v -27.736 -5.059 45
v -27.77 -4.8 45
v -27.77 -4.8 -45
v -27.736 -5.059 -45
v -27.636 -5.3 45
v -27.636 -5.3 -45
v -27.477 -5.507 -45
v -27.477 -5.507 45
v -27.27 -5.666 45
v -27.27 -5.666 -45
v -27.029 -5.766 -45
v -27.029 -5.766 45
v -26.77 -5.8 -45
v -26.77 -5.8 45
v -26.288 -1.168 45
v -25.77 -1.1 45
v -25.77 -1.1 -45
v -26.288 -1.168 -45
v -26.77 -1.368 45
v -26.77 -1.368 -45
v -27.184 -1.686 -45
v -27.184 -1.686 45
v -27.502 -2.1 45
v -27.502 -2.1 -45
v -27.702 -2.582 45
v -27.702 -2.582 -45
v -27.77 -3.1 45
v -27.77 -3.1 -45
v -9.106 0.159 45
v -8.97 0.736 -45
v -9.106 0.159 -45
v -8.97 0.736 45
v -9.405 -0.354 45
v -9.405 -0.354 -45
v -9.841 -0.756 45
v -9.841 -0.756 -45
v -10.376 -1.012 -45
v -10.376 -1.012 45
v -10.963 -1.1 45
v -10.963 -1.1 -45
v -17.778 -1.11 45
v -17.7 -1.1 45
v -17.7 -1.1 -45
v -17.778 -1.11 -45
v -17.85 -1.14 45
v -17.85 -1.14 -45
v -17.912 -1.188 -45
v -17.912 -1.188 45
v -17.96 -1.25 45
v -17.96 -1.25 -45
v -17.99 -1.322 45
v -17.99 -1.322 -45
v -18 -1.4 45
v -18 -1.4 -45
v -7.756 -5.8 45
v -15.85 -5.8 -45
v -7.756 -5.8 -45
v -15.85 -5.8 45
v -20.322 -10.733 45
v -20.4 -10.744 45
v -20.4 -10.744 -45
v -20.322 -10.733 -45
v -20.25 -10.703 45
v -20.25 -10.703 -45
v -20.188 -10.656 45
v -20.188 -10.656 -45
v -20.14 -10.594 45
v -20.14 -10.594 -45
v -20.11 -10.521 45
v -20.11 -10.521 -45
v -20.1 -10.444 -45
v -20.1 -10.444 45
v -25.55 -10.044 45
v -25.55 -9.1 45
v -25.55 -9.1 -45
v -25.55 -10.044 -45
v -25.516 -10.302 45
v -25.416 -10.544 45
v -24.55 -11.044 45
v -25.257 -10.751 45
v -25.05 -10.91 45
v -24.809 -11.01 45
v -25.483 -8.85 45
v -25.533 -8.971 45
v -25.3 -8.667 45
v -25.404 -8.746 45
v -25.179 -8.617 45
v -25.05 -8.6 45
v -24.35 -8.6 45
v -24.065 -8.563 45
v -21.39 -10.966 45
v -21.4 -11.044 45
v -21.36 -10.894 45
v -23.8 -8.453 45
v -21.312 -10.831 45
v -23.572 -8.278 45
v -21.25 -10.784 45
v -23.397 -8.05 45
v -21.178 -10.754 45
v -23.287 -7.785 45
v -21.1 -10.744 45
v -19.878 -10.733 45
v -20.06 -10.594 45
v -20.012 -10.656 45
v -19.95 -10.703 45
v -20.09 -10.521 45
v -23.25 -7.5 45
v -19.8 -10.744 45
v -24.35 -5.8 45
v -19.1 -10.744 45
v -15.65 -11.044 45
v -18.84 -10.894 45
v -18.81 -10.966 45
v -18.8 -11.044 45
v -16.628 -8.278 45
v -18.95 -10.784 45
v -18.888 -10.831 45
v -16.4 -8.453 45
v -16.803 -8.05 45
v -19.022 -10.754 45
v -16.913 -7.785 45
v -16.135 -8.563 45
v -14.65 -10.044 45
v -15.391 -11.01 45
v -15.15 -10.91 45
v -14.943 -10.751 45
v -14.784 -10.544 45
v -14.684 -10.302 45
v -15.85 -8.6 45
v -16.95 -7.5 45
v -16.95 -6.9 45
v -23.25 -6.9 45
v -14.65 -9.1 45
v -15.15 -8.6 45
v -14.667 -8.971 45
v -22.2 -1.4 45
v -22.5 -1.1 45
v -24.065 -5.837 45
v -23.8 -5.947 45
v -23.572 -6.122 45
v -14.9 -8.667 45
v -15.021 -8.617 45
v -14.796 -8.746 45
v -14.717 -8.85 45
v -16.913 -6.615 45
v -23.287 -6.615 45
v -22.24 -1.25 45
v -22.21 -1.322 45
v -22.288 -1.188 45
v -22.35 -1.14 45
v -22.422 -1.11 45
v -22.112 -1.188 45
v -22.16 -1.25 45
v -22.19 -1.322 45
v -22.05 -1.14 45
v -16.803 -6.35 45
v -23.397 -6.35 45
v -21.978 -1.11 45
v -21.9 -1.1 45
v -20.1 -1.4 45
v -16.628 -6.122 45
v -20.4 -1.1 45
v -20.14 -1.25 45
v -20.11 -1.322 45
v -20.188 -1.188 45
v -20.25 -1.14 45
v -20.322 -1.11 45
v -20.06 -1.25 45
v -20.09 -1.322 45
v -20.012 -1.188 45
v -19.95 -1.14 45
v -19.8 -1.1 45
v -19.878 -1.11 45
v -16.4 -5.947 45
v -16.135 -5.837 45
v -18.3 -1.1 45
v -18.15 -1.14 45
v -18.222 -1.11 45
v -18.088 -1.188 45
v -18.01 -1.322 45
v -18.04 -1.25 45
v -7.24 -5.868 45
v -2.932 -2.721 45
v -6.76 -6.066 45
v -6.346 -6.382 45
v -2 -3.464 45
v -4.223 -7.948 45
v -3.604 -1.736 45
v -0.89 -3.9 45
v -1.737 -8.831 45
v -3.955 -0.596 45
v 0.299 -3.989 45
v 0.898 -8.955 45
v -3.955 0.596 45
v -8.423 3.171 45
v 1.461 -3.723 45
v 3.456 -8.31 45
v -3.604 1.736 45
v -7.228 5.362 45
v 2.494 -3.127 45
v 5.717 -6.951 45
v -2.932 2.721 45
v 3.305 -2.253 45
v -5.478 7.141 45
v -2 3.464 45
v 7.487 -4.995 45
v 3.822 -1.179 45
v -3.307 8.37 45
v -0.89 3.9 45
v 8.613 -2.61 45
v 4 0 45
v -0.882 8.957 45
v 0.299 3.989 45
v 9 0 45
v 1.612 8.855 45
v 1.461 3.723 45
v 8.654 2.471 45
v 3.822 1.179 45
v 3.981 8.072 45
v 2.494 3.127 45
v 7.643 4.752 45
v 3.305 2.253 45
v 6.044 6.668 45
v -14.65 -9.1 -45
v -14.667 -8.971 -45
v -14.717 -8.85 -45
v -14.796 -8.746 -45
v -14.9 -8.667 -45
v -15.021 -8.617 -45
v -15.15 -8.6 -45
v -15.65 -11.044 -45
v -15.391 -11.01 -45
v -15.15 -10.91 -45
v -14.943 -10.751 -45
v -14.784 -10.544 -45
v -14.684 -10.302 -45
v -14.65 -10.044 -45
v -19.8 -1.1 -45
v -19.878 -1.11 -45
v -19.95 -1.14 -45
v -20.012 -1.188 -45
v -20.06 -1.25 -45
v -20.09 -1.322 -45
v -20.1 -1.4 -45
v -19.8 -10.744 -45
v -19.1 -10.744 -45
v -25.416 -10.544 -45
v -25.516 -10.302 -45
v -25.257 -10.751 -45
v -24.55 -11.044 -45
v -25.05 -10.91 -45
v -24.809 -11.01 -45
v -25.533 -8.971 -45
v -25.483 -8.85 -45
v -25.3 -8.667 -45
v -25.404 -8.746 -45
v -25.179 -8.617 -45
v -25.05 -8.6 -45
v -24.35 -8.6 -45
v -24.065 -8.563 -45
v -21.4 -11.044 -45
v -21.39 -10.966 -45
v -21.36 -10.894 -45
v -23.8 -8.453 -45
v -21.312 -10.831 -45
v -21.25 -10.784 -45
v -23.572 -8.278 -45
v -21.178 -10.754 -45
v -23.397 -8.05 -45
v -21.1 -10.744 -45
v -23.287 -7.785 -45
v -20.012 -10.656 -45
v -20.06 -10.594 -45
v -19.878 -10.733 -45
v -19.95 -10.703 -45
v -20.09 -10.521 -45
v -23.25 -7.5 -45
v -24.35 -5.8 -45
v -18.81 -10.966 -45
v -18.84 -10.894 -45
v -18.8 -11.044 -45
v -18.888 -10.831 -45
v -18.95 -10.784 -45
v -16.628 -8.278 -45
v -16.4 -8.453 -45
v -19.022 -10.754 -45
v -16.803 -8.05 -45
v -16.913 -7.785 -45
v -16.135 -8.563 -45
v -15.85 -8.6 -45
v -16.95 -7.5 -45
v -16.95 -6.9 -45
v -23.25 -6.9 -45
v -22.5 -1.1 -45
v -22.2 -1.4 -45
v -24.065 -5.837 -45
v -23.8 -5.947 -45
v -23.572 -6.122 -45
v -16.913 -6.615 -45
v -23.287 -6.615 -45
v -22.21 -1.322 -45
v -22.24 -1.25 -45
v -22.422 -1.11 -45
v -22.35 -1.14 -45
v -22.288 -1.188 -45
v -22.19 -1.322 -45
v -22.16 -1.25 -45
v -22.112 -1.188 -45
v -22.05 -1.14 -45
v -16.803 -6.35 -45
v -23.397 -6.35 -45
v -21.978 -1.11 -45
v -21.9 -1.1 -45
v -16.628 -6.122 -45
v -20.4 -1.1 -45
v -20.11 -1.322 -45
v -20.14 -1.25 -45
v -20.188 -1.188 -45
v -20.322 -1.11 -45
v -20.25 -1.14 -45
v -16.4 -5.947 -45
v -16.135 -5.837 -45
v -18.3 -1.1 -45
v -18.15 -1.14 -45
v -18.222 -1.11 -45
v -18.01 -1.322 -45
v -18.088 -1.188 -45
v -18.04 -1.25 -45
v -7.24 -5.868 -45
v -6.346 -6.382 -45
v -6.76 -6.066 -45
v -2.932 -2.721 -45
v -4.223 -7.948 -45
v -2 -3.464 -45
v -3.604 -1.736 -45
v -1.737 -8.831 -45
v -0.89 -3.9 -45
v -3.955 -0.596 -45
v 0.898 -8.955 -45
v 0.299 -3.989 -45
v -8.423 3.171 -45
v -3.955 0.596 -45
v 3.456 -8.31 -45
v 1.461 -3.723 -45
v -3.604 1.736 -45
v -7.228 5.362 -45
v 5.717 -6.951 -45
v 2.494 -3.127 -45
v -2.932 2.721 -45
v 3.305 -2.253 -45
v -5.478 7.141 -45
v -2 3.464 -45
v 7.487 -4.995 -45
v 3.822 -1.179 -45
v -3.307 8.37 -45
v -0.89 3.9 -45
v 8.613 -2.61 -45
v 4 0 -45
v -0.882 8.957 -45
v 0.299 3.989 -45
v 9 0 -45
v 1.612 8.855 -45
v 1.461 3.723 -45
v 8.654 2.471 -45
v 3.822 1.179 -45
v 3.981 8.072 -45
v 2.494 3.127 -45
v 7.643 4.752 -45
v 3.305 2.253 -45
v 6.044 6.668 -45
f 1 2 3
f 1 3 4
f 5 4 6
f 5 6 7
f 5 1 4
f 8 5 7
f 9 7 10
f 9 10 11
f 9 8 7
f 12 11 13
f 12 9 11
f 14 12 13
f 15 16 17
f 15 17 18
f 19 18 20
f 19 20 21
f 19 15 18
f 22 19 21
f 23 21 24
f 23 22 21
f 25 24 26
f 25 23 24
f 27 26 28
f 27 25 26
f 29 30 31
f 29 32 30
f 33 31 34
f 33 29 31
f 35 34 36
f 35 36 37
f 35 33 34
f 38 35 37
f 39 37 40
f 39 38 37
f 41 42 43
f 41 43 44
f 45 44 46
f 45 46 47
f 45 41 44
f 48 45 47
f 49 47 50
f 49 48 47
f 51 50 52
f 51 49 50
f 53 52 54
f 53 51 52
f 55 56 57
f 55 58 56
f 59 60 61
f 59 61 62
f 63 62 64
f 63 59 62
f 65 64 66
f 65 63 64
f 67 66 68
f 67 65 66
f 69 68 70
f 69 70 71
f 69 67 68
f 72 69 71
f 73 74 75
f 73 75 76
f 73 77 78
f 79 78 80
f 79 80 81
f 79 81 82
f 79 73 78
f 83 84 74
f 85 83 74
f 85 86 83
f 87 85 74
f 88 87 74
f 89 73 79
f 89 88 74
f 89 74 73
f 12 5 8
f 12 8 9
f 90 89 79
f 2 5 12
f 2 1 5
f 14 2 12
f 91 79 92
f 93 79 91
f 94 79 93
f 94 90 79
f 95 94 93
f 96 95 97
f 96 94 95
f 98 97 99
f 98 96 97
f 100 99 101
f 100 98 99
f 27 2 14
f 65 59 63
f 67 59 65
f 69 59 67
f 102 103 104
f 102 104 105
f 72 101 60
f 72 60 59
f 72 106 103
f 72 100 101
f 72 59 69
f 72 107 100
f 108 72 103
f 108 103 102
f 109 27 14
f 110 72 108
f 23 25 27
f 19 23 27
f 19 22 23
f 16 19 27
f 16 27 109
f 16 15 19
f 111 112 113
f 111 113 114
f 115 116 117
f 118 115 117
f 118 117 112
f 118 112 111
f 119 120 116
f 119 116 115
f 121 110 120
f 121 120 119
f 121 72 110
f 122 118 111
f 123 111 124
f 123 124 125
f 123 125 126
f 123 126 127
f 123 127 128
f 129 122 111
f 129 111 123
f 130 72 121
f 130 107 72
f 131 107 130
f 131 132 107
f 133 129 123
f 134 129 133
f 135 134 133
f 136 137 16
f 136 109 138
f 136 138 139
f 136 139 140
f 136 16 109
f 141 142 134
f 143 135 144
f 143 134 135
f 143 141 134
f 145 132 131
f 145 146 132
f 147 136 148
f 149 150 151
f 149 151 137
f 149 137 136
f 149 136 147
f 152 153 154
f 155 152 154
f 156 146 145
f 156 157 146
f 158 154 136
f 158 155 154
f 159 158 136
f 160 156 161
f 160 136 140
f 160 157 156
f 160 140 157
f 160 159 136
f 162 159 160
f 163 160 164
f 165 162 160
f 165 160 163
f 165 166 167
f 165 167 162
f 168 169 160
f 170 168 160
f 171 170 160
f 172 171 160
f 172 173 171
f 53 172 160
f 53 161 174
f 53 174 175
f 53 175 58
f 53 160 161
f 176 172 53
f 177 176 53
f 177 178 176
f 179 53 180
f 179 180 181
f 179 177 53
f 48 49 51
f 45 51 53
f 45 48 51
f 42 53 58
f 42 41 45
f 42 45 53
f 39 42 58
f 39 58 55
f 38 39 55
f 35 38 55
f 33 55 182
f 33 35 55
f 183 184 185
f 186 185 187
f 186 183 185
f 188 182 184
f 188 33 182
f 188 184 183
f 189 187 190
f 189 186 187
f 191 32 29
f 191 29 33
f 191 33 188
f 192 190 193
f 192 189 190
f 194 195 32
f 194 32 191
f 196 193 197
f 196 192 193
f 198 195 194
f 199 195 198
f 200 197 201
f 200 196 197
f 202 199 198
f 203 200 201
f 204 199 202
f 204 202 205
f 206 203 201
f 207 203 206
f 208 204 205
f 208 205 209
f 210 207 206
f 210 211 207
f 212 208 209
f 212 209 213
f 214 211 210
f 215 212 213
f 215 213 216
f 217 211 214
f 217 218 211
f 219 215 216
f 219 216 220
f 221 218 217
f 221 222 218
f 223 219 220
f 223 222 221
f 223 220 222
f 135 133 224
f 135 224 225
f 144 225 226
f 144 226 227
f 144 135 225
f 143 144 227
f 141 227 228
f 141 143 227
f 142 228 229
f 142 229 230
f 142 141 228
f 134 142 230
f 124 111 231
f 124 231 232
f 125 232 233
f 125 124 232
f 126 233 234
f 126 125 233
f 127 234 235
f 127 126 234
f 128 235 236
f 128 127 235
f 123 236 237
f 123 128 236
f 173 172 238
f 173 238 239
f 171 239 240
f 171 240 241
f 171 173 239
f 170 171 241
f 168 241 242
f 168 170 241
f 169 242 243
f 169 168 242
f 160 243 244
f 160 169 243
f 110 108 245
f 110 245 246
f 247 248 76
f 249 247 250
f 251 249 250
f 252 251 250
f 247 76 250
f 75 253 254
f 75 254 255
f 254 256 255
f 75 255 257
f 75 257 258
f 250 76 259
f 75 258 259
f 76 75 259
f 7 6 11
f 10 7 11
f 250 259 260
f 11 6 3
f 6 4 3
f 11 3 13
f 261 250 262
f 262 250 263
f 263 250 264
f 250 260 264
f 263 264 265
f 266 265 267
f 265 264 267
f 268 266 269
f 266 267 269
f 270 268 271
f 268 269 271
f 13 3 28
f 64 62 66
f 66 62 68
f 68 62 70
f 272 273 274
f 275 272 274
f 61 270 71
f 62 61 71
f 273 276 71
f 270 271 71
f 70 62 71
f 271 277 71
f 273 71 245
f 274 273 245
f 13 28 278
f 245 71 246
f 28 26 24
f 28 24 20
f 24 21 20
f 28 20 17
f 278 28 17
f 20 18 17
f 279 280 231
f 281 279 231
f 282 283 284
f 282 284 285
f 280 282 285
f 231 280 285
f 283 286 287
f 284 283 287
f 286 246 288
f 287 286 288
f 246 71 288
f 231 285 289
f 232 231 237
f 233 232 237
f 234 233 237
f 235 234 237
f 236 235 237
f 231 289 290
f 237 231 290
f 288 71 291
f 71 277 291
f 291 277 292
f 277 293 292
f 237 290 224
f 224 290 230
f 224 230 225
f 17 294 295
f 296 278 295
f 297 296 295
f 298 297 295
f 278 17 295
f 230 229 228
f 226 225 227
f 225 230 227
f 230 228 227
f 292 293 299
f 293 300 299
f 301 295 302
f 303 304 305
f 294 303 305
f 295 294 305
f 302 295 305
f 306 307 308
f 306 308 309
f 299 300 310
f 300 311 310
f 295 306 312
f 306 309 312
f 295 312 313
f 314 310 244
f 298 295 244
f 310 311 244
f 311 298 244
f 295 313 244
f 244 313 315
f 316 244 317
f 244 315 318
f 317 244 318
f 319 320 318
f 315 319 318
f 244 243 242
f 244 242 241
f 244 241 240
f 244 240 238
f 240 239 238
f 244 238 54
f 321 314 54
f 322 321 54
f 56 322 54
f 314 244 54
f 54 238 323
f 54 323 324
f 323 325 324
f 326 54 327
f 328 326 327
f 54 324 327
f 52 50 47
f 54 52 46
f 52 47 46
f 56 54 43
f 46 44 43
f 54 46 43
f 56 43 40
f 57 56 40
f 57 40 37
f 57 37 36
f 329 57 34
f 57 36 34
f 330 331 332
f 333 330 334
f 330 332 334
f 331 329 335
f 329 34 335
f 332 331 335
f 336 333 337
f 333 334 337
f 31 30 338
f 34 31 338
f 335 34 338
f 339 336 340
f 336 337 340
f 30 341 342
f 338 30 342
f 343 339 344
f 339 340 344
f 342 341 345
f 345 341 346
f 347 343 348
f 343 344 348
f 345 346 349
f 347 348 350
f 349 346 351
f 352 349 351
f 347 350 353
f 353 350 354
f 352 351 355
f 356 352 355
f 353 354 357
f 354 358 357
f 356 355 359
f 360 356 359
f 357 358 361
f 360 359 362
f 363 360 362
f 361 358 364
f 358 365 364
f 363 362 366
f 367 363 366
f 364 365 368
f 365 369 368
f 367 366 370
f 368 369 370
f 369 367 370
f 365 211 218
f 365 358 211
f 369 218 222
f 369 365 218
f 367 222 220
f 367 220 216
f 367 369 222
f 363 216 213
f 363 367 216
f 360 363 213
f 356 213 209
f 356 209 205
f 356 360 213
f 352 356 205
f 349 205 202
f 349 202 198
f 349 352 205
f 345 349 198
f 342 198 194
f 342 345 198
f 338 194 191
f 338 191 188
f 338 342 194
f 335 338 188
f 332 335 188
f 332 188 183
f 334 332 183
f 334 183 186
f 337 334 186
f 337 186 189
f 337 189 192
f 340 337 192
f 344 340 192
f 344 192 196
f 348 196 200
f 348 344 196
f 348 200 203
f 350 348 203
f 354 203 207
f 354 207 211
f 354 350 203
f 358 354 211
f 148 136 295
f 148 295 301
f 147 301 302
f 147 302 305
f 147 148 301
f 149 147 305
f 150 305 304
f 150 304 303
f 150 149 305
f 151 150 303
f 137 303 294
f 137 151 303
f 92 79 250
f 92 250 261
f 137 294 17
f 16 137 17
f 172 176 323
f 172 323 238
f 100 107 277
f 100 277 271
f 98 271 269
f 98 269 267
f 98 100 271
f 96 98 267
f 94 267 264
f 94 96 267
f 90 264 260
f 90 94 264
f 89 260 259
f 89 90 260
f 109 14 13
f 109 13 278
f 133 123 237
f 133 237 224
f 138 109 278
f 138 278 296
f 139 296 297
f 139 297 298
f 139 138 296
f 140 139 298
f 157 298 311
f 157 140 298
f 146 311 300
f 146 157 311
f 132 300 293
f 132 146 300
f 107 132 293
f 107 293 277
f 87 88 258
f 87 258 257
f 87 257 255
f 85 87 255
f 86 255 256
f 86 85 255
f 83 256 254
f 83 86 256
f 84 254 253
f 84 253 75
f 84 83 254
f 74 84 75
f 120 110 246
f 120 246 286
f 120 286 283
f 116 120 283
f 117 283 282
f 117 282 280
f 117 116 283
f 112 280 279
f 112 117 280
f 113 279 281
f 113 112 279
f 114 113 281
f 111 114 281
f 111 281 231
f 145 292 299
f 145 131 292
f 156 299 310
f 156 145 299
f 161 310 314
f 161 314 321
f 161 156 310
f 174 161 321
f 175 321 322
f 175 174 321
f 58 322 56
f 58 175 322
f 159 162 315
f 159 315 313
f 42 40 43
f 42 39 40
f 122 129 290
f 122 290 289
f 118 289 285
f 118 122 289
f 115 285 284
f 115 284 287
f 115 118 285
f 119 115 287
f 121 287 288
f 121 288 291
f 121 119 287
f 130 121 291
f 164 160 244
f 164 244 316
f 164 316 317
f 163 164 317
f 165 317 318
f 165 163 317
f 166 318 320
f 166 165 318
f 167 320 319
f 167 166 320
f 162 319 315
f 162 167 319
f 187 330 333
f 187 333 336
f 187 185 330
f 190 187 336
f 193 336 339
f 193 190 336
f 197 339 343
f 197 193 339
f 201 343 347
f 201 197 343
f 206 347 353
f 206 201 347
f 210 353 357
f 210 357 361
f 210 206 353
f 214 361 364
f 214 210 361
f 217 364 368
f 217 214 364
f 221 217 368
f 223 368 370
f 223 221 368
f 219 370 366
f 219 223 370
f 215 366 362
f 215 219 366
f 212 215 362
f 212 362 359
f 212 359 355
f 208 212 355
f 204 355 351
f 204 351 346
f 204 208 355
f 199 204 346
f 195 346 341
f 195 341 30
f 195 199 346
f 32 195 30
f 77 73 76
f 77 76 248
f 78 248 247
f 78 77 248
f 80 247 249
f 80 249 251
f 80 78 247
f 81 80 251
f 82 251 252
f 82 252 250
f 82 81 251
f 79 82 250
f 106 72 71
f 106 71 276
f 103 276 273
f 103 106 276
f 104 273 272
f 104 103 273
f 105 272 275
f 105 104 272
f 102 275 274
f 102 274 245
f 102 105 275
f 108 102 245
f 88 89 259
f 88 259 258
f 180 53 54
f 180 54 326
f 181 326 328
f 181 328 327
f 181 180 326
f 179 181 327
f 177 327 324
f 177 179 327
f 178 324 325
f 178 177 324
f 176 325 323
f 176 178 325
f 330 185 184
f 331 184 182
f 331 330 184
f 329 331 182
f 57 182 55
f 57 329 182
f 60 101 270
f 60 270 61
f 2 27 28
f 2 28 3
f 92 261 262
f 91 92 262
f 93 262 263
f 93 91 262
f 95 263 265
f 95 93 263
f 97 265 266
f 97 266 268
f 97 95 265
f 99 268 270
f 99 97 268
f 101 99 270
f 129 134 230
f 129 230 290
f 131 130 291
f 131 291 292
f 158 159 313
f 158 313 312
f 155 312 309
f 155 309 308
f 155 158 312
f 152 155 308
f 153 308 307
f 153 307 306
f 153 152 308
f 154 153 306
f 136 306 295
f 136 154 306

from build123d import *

# Parameters (mm, degrees)
F0_R     = 4
F1_DEPTH = 45
F2_R     = 2


with BuildPart() as f1:
    # F0 (on Top) → F1 (new body, symmetric)
    with BuildSketch(Plane.XY):
        with BuildLine():
            ThreePointArc((-6.8818602136, -5.8), (3.0873336455, -8.4538967915), (9, 0))
            ThreePointArc((9, 0), (-0.5510337779, 8.9831153714), (-8.932524839, -1.1))
            ThreePointArc((-8.932524839, -1.1), (-8.2490116771, -3.5991396682), (-6.8818602136, -5.8))
        make_face()
        Circle(F0_R, mode=Mode.SUBTRACT)
        with BuildLine():
            ThreePointArc((-6.8818602136, -5.8), (-8.2490116771, -3.5991396682), (-8.932524839, -1.1))
            Line((-8.932524839, -1.1), (-17.7, -1.1))
            ThreePointArc((-17.7, -1.1), (-17.9121320344, -1.1878679656), (-18, -1.4))
            ThreePointArc((-18, -1.4), (-18.0878679656, -1.1878679656), (-18.3, -1.1))
            Line((-18.3, -1.1), (-19.8, -1.1))
            ThreePointArc((-19.8, -1.1), (-20.0121320344, -1.1878679656), (-20.1, -1.4))
            ThreePointArc((-20.1, -1.4), (-20.1878679656, -1.1878679656), (-20.4, -1.1))
            Line((-20.4, -1.1), (-21.7159694135, -1.1))
            Line((-21.7159694135, -1.1), (-21.9, -1.1))
            ThreePointArc((-21.9, -1.1), (-22.1121320344, -1.1878679656), (-22.2, -1.4))
            ThreePointArc((-22.2, -1.4), (-22.2878679656, -1.1878679656), (-22.5, -1.1))
            Line((-22.5, -1.1), (-25.77, -1.1))
            ThreePointArc((-25.77, -1.1), (-27.1842135624, -1.6857864376), (-27.77, -3.1))
            Line((-27.77, -3.1), (-27.77, -4.8))
            ThreePointArc((-27.77, -4.8), (-27.4771067812, -5.5071067812), (-26.77, -5.8))
            Line((-26.77, -5.8), (-24.35, -5.8))
            ThreePointArc((-24.35, -5.8), (-23.5721825407, -6.1221825407), (-23.25, -6.9))
            Line((-23.25, -6.9), (-23.25, -7.5))
            ThreePointArc((-23.25, -7.5), (-23.5721825407, -8.2778174593), (-24.35, -8.6))
            Line((-24.35, -8.6), (-25.05, -8.6))
            ThreePointArc((-25.05, -8.6), (-25.4035533906, -8.7464466094), (-25.55, -9.1))
            Line((-25.55, -9.1), (-25.55, -10.0435914154))
            ThreePointArc((-25.55, -10.0435914154), (-25.2571067812, -10.7506981966), (-24.55, -11.0435914154))
            Line((-24.55, -11.0435914154), (-21.4, -11.0435914154))
            ThreePointArc((-21.4, -11.0435914154), (-21.3121320344, -10.8314593811), (-21.1, -10.7435914154))
            Line((-21.1, -10.7435914154), (-20.4, -10.7435914154))
            ThreePointArc((-20.4, -10.7435914154), (-20.1878679656, -10.6557234498), (-20.1, -10.4435914154))
            ThreePointArc((-20.1, -10.4435914154), (-20.0121320344, -10.6557234498), (-19.8, -10.7435914154))
            Line((-19.8, -10.7435914154), (-19.1, -10.7435914154))
            ThreePointArc((-19.1, -10.7435914154), (-18.8878679656, -10.8314593811), (-18.8, -11.0435914154))
            Line((-18.8, -11.0435914154), (-15.65, -11.0435914154))
            ThreePointArc((-15.65, -11.0435914154), (-14.9428932188, -10.7506981966), (-14.65, -10.0435914154))
            Line((-14.65, -10.0435914154), (-14.65, -9.1))
            ThreePointArc((-14.65, -9.1), (-14.7964466094, -8.7464466094), (-15.15, -8.6))
            Line((-15.15, -8.6), (-15.85, -8.6))
            ThreePointArc((-15.85, -8.6), (-16.6278174593, -8.2778174593), (-16.95, -7.5))
            Line((-16.95, -7.5), (-16.95, -6.9))
            ThreePointArc((-16.95, -6.9), (-16.6278174593, -6.1221825407), (-15.85, -5.8))
            Line((-15.85, -5.8), (-6.8818602136, -5.8))
        make_face()
    extrude(amount=F1_DEPTH, both=True)

    # F2
    f2_edges = [f1.edges().sort_by_distance(p)[0] for p in [
        (-6.88186, -5.8, 0),
        (-8.932525, -1.1, 0),
    ]]
    fillet(f2_edges, radius=F2_R)


solid = f1.part
